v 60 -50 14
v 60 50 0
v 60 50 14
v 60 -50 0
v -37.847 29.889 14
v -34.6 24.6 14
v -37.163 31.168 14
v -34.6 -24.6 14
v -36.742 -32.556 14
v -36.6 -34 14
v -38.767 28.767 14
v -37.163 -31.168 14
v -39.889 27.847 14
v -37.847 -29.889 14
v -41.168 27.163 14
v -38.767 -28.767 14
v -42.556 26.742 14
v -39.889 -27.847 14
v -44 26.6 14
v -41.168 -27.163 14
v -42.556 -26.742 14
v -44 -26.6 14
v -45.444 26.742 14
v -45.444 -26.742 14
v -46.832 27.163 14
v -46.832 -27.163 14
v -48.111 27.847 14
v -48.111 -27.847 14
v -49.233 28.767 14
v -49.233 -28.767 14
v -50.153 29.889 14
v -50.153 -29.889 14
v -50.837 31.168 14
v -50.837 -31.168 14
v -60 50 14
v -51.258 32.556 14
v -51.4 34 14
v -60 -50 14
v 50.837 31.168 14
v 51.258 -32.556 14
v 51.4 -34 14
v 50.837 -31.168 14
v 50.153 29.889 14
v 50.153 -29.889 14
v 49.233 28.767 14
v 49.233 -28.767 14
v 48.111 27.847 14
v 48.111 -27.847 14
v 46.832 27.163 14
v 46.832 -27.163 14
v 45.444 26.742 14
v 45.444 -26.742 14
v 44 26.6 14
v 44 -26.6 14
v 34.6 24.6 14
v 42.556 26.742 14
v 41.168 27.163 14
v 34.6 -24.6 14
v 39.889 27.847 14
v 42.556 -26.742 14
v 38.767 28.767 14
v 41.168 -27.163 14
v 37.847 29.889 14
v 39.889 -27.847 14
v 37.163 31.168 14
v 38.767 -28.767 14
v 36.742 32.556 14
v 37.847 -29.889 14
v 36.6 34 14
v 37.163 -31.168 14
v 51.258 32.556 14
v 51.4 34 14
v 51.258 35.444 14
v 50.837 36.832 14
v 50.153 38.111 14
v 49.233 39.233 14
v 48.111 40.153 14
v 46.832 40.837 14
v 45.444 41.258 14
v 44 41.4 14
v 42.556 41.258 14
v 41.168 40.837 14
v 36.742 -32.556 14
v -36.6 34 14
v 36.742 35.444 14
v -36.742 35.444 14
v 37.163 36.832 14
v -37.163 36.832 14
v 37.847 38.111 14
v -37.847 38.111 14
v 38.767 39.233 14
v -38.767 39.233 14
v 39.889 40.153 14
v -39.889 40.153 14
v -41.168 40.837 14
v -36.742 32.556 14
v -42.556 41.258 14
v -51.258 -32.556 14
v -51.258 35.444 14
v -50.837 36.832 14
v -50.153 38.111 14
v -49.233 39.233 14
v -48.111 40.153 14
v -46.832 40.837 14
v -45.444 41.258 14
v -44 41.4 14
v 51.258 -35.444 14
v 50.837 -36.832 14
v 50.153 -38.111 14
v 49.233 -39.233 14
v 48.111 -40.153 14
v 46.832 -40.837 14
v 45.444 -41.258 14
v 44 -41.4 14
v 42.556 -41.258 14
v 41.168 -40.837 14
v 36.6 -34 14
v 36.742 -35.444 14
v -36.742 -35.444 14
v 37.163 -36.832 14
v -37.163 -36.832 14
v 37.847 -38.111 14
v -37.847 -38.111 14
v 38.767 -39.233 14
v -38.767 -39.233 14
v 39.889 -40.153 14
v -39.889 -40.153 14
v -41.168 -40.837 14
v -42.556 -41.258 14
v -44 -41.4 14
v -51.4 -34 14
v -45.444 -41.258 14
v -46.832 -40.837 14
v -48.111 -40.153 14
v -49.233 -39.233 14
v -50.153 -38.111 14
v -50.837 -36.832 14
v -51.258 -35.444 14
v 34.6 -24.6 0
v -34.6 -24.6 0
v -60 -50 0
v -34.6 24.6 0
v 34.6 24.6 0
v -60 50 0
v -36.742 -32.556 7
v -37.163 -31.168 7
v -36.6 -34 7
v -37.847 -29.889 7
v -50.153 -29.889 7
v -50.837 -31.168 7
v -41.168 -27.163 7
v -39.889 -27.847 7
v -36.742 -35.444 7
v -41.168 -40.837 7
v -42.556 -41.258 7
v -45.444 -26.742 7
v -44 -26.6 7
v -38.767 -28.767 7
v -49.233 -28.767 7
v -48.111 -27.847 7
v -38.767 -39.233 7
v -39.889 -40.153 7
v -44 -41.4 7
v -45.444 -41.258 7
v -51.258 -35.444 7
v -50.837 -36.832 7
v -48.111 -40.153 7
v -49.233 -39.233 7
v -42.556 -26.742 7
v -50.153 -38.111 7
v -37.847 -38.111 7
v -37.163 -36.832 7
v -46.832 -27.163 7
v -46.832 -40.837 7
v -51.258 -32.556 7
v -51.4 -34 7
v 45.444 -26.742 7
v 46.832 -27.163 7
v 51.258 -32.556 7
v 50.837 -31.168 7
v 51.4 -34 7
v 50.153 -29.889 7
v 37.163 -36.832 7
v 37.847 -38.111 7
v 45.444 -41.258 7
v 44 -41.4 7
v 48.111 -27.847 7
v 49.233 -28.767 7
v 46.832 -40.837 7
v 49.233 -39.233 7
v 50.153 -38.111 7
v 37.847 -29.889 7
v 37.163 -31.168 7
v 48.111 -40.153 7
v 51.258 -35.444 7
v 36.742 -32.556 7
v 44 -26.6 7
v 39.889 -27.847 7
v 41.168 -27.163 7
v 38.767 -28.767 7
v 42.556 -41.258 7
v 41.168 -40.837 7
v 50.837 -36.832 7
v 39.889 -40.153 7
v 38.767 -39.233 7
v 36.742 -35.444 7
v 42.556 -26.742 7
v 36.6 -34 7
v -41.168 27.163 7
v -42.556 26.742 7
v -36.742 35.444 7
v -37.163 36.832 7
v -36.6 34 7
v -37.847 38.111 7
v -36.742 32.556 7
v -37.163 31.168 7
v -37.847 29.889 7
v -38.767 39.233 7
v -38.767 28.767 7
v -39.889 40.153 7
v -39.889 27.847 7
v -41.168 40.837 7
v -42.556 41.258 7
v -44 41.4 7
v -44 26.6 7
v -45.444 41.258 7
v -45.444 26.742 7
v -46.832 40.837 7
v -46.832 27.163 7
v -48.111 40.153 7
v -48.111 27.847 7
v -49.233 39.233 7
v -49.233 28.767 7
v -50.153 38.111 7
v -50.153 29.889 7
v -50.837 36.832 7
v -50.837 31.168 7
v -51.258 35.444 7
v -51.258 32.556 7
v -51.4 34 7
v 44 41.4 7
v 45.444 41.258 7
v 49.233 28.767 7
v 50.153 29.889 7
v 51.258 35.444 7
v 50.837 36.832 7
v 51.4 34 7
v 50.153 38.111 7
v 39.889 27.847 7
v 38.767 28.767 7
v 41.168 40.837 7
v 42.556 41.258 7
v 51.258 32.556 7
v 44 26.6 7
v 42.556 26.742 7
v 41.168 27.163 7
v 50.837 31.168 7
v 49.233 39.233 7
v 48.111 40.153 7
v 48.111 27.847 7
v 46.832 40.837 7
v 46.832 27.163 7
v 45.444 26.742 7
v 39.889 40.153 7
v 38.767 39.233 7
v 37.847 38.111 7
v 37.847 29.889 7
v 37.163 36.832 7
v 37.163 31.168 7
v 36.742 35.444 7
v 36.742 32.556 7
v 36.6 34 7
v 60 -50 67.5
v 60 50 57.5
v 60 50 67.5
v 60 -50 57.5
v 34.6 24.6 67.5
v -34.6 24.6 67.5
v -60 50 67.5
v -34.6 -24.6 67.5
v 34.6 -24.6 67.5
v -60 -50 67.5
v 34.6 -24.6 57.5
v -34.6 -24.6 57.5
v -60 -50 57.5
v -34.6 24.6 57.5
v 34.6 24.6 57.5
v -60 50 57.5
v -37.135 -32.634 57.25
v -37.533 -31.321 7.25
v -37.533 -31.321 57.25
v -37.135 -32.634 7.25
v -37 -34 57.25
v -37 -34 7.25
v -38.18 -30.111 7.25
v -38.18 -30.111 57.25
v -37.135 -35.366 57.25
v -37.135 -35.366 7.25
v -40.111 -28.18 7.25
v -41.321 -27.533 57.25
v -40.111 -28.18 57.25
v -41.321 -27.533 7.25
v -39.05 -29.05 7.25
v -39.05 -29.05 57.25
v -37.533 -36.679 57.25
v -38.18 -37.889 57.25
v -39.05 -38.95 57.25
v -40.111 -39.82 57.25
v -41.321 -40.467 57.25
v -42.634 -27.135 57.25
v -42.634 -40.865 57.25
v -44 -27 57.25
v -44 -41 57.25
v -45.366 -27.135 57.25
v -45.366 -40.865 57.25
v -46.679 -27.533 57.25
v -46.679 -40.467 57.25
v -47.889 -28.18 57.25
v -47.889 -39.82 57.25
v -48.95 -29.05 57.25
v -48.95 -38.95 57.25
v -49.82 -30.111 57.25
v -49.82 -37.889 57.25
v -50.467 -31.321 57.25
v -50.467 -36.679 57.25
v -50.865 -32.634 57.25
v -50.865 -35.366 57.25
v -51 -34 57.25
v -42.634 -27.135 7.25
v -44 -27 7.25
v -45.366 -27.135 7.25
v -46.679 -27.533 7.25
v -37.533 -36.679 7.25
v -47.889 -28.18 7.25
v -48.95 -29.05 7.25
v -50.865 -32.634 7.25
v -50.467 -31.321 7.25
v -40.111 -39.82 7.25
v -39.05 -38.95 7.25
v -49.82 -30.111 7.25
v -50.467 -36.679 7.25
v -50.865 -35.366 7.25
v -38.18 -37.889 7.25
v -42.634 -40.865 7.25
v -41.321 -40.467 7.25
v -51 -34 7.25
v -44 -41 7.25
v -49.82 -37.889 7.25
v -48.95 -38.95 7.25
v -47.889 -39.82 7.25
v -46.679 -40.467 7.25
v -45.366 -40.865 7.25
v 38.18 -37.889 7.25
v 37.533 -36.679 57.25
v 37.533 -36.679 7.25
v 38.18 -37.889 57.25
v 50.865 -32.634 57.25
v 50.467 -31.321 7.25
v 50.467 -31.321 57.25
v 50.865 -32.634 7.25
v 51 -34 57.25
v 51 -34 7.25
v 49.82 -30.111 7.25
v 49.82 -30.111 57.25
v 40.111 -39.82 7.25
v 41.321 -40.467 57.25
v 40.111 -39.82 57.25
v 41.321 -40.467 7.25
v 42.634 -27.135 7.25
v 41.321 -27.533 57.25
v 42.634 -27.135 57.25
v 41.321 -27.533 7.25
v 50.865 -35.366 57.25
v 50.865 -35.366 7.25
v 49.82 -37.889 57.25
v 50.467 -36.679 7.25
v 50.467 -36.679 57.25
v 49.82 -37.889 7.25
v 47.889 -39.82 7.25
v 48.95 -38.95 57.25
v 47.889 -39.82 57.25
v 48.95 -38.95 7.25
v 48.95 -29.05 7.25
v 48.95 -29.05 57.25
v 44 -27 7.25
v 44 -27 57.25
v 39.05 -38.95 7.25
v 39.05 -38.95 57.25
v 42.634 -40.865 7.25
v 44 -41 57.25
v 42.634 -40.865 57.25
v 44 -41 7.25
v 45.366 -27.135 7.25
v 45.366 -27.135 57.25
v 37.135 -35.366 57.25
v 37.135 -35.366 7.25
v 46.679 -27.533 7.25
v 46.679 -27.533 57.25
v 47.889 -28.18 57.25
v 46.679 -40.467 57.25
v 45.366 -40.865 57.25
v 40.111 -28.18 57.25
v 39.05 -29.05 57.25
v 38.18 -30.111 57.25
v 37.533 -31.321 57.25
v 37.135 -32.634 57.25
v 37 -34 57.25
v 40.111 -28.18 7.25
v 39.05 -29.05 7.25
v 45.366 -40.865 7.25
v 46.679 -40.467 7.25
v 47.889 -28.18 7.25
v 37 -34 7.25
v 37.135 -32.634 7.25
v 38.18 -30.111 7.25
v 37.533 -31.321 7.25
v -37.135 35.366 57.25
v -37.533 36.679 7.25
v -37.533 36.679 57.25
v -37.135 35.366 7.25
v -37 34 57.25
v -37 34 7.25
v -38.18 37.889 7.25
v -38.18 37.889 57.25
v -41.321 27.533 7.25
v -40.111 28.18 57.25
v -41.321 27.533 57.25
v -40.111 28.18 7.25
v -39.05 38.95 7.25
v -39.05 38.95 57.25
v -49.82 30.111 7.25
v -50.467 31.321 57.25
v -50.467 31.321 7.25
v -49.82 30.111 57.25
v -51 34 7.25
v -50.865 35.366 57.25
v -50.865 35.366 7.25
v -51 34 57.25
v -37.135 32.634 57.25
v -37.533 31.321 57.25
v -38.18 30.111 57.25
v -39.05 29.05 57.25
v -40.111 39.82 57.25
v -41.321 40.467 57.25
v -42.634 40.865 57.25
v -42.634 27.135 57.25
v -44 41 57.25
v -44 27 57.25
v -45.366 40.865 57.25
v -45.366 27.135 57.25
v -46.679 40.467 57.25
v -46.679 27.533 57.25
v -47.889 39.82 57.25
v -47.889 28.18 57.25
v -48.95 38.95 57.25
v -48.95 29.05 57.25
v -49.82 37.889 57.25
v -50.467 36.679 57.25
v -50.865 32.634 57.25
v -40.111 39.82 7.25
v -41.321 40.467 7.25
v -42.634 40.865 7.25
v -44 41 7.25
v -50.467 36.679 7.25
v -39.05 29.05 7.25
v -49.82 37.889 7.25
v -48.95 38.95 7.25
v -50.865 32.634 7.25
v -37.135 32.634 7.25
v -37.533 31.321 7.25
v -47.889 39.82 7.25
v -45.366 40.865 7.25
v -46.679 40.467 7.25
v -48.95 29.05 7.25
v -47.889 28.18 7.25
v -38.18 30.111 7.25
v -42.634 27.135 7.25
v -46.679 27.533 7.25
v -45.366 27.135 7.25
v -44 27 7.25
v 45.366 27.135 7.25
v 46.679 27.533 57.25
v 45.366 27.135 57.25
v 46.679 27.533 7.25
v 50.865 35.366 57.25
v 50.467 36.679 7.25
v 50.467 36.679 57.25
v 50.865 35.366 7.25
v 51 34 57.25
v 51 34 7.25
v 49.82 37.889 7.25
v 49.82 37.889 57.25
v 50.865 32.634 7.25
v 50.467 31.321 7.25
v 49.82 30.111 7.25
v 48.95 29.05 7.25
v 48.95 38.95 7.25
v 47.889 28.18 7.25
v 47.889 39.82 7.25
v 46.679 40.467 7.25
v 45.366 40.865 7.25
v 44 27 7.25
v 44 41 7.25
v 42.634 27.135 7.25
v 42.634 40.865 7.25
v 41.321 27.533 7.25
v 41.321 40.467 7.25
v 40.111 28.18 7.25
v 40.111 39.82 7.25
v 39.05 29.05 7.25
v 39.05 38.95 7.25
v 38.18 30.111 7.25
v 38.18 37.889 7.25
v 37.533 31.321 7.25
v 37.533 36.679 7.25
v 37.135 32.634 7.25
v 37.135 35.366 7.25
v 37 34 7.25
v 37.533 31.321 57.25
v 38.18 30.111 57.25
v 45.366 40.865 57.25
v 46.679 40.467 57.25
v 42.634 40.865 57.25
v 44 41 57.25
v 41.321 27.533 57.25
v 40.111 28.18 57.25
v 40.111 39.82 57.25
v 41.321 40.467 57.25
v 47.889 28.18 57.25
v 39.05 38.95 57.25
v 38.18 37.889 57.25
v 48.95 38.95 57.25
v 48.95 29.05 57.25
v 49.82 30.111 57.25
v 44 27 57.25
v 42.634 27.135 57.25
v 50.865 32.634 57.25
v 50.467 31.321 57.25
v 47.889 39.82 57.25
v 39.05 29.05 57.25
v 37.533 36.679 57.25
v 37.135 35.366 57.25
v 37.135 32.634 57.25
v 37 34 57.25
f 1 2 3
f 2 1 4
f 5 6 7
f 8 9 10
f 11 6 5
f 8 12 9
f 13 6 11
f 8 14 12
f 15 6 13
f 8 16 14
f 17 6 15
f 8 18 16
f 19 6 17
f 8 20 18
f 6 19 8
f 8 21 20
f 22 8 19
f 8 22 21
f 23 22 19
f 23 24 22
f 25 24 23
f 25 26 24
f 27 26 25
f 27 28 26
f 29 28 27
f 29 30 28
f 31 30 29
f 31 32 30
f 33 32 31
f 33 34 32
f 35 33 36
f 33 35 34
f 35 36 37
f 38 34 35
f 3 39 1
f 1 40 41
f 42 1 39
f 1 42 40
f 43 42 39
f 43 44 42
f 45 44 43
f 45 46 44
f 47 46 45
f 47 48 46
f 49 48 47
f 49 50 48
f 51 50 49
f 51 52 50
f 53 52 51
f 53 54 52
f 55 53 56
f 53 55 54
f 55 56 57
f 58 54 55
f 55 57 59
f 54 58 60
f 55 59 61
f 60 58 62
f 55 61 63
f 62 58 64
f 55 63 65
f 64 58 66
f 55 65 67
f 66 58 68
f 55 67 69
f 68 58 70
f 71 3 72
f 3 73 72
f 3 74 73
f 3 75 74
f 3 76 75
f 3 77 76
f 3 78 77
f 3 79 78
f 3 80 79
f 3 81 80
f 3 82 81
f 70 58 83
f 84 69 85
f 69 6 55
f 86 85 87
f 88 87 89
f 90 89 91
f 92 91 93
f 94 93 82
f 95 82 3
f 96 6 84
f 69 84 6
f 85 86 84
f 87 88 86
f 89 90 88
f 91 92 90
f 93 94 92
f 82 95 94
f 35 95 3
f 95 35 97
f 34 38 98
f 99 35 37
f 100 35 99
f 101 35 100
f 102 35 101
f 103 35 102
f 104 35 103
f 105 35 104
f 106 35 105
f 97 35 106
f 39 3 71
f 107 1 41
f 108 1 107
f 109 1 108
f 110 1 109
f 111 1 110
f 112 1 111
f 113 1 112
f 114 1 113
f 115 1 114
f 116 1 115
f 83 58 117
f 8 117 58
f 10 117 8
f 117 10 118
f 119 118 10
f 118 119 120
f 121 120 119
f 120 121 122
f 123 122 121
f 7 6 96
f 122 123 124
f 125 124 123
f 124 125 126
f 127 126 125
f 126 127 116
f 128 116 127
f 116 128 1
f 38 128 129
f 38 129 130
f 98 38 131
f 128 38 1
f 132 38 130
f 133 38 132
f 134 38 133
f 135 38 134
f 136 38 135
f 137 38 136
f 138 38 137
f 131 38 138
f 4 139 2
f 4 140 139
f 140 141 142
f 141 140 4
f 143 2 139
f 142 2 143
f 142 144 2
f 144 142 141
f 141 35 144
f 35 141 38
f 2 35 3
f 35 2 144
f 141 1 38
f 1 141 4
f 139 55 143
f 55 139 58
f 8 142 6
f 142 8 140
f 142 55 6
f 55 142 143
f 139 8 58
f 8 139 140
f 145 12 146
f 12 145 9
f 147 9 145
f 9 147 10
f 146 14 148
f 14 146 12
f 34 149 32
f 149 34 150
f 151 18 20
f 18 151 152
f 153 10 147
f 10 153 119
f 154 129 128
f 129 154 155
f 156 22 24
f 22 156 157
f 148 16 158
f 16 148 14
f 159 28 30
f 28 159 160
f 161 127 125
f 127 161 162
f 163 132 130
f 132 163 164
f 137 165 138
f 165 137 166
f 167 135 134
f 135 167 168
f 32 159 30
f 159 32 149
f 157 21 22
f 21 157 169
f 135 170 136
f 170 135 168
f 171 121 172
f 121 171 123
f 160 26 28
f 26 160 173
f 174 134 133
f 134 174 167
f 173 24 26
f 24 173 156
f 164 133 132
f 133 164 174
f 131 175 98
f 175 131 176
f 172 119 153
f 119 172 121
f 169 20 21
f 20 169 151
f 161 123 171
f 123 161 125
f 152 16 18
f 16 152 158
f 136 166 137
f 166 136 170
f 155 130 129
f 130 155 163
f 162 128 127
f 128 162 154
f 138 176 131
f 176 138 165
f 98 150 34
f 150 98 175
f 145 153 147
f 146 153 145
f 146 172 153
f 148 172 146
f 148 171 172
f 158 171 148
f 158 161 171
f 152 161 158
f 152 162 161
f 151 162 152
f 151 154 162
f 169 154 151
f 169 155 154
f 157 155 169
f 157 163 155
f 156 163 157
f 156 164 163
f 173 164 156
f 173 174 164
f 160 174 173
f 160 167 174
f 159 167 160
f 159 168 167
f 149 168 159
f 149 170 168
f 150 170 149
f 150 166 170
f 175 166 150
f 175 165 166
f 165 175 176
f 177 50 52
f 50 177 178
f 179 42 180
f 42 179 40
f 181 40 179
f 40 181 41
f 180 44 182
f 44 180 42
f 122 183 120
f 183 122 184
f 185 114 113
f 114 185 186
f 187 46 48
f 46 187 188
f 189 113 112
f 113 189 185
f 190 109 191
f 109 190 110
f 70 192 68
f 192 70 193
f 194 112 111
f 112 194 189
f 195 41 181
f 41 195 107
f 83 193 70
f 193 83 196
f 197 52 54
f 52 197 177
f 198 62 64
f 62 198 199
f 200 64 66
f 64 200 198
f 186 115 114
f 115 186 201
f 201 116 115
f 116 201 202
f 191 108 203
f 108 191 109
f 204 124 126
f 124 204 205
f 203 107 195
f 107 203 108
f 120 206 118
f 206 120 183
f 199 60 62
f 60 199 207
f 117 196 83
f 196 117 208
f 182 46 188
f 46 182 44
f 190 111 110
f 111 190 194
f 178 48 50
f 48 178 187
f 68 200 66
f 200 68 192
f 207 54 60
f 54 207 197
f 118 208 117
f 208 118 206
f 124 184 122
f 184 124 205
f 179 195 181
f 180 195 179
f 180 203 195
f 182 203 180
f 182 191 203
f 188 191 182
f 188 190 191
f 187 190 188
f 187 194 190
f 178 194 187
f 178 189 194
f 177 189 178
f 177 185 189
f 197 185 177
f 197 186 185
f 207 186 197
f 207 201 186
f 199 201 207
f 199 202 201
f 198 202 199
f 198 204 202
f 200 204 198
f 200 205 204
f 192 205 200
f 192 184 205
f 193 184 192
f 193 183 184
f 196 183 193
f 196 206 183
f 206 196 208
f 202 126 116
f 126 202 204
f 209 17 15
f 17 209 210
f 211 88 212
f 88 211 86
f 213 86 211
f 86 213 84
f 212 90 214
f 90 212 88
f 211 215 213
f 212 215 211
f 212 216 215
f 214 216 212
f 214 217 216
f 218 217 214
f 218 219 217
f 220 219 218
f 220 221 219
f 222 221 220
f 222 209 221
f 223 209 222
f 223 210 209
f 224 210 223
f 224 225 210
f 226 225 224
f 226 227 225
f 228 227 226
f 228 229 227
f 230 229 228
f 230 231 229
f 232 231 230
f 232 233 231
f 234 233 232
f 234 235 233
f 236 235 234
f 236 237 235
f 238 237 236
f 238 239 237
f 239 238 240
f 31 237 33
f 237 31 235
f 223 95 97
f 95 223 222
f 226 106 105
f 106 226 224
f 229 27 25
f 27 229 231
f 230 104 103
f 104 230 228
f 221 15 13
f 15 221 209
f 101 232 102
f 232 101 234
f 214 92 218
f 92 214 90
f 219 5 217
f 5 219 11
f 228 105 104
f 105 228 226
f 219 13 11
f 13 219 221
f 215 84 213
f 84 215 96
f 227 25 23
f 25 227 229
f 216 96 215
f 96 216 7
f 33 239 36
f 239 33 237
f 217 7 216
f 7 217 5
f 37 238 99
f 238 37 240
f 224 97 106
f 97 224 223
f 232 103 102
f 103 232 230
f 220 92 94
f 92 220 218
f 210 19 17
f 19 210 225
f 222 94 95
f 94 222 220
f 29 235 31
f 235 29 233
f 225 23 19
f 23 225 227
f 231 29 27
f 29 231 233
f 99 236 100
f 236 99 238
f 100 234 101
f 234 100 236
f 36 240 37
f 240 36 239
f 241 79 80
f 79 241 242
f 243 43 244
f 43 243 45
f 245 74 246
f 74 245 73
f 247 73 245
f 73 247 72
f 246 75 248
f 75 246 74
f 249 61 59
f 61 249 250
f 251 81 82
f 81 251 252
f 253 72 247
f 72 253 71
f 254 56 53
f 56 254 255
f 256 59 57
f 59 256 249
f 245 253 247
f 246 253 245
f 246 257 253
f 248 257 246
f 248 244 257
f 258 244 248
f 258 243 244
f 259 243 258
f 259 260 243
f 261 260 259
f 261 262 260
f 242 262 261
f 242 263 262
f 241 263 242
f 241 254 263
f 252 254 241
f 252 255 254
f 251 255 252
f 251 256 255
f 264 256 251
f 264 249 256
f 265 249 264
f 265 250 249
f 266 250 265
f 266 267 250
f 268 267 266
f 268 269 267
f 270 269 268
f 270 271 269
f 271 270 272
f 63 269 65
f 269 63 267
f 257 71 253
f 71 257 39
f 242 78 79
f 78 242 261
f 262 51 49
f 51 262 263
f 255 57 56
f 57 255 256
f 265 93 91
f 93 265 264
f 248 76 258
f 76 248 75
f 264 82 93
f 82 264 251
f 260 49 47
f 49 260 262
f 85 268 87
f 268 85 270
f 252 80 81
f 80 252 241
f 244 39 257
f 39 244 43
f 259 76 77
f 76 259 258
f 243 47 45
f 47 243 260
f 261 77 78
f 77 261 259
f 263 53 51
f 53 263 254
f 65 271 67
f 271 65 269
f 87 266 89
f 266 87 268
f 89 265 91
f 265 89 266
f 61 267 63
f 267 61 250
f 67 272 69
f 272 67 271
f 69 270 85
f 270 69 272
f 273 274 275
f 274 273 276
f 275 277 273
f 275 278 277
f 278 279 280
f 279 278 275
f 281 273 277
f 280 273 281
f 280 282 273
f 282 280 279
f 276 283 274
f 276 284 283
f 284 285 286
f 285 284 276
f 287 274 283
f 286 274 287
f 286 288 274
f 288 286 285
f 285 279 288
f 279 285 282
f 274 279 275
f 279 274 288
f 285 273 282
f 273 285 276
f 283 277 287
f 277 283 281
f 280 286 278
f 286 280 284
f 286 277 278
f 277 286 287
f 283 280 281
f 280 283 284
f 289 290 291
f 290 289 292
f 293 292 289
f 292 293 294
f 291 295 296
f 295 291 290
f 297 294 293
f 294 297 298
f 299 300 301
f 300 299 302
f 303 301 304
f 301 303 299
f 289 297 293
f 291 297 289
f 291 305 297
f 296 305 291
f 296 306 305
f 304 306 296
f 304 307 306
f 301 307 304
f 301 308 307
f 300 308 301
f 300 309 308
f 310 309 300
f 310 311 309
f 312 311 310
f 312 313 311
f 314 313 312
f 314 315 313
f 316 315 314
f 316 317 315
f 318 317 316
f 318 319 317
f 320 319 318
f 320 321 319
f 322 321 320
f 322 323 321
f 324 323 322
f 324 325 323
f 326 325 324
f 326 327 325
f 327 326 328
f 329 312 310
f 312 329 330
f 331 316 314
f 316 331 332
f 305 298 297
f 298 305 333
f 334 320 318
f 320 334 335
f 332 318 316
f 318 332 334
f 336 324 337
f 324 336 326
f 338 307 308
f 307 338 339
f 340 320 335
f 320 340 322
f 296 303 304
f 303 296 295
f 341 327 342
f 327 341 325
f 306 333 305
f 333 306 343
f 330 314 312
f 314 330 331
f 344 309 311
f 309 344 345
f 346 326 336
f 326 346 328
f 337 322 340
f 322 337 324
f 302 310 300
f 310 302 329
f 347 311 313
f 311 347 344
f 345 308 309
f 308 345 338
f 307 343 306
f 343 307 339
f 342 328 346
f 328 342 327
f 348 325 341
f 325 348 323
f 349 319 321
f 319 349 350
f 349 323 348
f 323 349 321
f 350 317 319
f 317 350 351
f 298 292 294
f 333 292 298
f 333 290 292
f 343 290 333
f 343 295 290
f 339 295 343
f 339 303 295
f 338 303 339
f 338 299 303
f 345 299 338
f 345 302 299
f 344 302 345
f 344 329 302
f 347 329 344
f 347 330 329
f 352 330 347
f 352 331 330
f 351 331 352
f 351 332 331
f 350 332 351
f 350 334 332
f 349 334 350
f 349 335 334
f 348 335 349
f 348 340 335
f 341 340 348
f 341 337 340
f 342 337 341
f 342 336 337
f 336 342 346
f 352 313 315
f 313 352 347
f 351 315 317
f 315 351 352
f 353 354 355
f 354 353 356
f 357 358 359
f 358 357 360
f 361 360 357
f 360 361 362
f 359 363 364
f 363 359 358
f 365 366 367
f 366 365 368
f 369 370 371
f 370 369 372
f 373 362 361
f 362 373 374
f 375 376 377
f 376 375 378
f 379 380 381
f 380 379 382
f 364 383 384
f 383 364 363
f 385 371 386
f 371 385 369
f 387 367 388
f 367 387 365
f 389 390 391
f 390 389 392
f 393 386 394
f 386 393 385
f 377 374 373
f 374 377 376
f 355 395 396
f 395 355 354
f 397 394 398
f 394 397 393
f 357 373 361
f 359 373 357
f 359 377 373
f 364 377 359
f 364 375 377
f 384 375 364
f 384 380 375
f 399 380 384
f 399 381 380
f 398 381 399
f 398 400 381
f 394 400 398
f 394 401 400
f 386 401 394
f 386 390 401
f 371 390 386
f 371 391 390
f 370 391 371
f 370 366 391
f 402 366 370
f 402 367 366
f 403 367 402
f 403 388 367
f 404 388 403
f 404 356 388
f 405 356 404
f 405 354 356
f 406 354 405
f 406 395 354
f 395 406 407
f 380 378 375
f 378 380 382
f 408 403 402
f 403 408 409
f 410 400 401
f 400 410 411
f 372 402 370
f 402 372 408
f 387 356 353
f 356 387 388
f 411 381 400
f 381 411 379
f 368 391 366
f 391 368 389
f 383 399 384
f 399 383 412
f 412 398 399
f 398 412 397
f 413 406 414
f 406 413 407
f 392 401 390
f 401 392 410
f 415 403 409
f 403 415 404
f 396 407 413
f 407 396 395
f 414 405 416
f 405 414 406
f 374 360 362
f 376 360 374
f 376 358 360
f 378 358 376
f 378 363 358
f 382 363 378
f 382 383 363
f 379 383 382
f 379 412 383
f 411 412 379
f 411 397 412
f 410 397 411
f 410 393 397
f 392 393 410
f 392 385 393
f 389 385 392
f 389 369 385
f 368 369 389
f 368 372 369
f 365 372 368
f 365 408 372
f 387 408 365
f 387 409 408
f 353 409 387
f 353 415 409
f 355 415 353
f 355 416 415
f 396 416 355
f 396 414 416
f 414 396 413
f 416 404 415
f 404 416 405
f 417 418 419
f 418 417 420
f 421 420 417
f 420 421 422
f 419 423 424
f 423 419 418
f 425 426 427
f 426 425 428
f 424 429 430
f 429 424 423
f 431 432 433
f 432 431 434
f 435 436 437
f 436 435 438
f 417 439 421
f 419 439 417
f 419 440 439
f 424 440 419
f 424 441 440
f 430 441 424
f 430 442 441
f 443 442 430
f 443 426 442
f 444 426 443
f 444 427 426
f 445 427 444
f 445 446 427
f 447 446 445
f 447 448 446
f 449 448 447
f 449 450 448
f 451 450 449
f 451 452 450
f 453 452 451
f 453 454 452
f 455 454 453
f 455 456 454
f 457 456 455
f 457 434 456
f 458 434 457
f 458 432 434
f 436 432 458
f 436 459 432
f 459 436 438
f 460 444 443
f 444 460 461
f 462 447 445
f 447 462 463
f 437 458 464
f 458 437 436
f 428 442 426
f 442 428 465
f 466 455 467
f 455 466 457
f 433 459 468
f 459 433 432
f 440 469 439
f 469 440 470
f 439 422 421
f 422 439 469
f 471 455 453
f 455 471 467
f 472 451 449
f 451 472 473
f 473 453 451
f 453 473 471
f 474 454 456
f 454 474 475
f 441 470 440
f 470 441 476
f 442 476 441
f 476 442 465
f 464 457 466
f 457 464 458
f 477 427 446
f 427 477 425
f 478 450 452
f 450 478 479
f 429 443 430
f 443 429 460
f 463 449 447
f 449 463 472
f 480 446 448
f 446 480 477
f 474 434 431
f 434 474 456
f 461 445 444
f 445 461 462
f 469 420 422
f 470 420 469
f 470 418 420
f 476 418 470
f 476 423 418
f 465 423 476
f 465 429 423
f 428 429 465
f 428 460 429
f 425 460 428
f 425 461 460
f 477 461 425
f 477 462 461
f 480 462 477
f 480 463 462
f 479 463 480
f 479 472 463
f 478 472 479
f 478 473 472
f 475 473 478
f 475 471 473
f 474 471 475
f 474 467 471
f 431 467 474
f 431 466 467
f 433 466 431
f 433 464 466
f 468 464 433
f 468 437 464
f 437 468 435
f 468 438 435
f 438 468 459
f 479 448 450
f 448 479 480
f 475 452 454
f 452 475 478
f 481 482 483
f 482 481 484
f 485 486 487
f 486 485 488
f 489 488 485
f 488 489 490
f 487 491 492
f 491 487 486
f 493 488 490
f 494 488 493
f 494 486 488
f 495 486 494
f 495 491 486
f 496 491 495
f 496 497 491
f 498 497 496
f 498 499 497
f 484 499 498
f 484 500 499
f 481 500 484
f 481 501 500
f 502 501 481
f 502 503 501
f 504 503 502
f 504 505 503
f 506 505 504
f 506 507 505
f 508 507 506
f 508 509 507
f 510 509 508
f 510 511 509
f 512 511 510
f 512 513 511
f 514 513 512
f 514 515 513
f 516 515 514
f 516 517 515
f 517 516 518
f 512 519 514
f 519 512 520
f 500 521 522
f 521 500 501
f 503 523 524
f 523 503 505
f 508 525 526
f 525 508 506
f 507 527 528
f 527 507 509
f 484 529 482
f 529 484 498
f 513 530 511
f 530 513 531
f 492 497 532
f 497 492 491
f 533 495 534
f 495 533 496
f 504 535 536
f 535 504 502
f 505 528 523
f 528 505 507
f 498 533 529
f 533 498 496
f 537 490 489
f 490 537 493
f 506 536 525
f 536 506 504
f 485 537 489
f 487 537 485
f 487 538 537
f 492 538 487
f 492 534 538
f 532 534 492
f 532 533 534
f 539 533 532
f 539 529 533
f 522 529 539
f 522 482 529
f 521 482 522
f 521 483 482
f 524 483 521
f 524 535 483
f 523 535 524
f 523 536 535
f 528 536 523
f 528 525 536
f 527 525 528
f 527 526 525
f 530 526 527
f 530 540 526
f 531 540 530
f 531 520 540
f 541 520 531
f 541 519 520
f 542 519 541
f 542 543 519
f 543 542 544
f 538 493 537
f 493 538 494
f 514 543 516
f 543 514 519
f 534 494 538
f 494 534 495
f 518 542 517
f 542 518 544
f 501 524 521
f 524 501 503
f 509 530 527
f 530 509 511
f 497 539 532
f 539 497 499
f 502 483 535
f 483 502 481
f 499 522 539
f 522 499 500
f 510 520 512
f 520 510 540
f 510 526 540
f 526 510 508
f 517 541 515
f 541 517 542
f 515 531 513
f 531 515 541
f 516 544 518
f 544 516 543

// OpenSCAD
$fn = 32;

// ------------------------------------------------------------------------
// Frame cube: base 120 x 100 mm, posts 50 mm tall
// Every part is its own module, assembly() places every instance.
// ------------------------------------------------------------------------

// --- part 1 ---
module base_frame() {
  difference() {
    translate([-60, -50, 0]) cube([120, 100, 14]);
    translate([-34.6, -24.6, -1]) cube([69.2, 49.2, 16]);
    translate([-44, -34, 7]) cylinder(h = 8, d = 14.8);
    translate([44, -34, 7]) cylinder(h = 8, d = 14.8);
    translate([-44, 34, 7]) cylinder(h = 8, d = 14.8);
    translate([44, 34, 7]) cylinder(h = 8, d = 14.8);
  }
}

// --- part 2 ---
module corner_post() {
  cylinder(h = 50, d = 14);
}

// --- part 3 ---
module top_frame() {
  difference() {
    translate([-60, -50, 0]) cube([120, 100, 10]);
    translate([-34.6, -24.6, -1]) cube([69.2, 49.2, 12]);
  }
}

// --- assembly ---
module assembly() {
  color([0.80, 0.24, 0.20]) translate([0, 0, 0]) rotate([0, 0, 0]) base_frame();
  color([0.20, 0.45, 0.75]) translate([-44, -34, 7.25]) rotate([0, 0, 0]) corner_post();
  color([0.25, 0.62, 0.32]) translate([44, -34, 7.25]) rotate([0, 0, 0]) corner_post();
  color([0.92, 0.70, 0.18]) translate([-44, 34, 7.25]) rotate([0, 0, 0]) corner_post();
  color([0.58, 0.35, 0.70]) translate([44, 34, 7.25]) rotate([0, 0, 0]) corner_post();
  color([0.16, 0.66, 0.66]) translate([0, 0, 57.5]) rotate([0, 0, 0]) top_frame();
}

assembly();
